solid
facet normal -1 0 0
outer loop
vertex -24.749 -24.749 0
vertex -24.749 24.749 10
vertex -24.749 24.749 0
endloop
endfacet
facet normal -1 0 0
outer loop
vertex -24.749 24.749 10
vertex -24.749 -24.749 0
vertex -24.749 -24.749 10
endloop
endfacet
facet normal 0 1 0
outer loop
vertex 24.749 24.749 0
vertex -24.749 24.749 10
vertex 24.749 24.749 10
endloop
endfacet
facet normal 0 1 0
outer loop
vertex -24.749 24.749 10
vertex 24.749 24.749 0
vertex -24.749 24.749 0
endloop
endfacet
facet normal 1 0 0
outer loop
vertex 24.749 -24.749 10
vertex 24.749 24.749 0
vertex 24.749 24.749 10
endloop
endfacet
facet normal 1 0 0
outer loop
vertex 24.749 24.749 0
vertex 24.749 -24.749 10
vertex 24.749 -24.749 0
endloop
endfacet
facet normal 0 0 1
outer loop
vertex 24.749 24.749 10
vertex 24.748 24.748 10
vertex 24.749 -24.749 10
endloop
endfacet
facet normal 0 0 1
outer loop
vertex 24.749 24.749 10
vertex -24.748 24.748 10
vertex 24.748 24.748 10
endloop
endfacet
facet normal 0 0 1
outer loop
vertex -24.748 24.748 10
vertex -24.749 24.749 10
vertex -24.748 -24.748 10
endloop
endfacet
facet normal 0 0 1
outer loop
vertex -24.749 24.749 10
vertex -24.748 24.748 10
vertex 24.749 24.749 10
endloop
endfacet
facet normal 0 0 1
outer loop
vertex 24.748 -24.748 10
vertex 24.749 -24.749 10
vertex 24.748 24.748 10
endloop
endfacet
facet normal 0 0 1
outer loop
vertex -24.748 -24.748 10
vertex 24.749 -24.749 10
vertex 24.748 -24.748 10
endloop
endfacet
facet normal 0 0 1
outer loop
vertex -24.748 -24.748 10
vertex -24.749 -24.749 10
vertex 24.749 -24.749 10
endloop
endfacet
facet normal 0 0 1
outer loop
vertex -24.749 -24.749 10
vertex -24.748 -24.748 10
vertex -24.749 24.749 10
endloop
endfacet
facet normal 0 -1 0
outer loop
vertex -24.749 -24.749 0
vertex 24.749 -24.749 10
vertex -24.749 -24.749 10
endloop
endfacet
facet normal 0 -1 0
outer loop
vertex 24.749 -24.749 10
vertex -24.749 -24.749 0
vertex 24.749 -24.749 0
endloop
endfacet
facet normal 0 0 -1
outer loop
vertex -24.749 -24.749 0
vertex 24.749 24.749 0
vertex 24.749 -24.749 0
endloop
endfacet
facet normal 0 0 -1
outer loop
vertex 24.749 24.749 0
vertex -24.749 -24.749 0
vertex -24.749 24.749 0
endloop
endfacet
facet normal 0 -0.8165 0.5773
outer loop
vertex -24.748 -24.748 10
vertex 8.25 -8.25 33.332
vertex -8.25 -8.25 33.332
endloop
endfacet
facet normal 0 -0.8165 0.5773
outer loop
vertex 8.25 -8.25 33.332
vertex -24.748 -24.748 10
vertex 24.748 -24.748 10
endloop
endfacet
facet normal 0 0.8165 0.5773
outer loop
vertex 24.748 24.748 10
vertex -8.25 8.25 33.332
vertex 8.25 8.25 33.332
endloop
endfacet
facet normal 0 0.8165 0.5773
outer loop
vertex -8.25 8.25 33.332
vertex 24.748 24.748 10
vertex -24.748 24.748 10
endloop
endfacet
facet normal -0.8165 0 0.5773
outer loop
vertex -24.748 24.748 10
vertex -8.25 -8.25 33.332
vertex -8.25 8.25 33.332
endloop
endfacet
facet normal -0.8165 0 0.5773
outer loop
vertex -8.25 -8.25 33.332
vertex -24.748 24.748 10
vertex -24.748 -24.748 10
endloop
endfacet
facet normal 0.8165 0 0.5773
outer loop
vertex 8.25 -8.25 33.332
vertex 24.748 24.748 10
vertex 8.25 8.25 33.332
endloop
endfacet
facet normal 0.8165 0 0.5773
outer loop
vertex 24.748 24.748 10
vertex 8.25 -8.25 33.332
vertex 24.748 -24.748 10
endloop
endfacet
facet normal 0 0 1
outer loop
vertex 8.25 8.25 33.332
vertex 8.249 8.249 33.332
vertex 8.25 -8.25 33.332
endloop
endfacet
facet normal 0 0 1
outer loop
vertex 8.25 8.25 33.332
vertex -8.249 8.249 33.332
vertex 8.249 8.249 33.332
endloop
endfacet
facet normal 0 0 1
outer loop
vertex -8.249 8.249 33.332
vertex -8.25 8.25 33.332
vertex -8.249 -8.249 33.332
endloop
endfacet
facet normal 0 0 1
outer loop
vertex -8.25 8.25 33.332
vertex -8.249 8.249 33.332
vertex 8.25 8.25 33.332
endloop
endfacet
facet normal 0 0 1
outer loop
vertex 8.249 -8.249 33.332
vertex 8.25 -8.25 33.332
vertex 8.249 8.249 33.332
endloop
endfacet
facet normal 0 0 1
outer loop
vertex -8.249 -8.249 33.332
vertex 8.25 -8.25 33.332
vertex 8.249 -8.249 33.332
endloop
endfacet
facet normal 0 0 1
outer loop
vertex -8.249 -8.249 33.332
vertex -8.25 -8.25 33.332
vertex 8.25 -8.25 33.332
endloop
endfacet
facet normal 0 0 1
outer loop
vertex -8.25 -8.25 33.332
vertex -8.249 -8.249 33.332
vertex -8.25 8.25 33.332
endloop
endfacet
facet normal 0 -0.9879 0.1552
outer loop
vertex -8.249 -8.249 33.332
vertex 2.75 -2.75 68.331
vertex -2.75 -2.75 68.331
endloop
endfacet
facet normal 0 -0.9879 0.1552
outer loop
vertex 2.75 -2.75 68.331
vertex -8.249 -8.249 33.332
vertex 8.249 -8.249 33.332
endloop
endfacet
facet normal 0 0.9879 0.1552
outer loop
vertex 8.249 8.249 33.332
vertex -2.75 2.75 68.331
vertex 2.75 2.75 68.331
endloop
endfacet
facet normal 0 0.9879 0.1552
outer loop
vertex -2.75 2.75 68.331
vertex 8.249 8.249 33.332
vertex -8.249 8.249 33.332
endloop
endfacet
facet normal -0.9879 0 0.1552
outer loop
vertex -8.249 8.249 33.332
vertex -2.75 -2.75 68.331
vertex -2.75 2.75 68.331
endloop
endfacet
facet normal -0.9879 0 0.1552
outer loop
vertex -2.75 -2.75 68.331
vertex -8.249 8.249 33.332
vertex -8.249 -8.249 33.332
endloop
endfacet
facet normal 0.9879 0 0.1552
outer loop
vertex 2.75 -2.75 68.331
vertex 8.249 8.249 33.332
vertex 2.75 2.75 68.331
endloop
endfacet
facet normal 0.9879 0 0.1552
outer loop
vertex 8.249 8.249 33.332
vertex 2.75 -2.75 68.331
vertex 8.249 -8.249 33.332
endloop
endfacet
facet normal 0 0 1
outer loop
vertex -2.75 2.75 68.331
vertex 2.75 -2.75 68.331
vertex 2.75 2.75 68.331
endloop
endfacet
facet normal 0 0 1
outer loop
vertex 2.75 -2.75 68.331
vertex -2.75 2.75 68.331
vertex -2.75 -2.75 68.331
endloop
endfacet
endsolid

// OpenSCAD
// This makes use of the $fn function to limit the number of facets (sides) of cylinders.
// So essentially this is just a cylinder with a couple of cones stacked on top.
// Setting $fn to 3 gives a 3 sided funnel (triangular) funnel.
// Setting $fn to 4 gives a 4 sided (square) funnel.
// etc. The higher the number, the more "round" it becomes.

// REALLY IMPORTANT. THE STL PRODUCES A SOLID OBJECT WHICH WON'T BE MUCH USE AS A FUNNEL. 
// TO MAKE THIS WORK, YOU NEED TO SLICE IT WITH NO TOP AND BOTTOM LAYERS, NO INFILL, BUT 3 OR 4 PERIMETERS.
// THAT WILL PRODUCE A G-CODE WHICH WILL MAKE A HOLLOW FUNNEL.


// Number of sides. 3 makes a trangular funnel, 4 makes a square funnel, 5 would be pentagonal, etc
Number_Of_Sides = 4;

$fn=Number_Of_Sides;

// Width across corners . NOTE this is the width across the corners, not across the flats. 
// Essentialy, the width is the diameter of a circle within which your funnel will fit.
// So for example, if you want a 4 sided cone that is 100 mm across flats, you will need 
// to set the width to approximately 1.4 times greater - i.e. 140mm.

Width_Across_Corners = 70;

dia1=Width_Across_Corners;


// If you want, you can change the proportions by playing around with the following variables.


dia2=dia1/3;
dia3=dia2/3;
h1=dia1/7;
h2=dia1/3;
h3=dia1/2;


// This is the main code section

rotate ([0,0,45])
cylinder (d=dia1, h=h1);
rotate ([0,0,45])
translate ([0,0,(h1-.001)]) // Set the z axis starting point very slightly lower to ensure that it is manifold 
cylinder (d1=dia1, d2=dia2, h= h2);
rotate ([0,0,45])
translate ([0,0,(h1+h2-.002)]) // As above comment.
cylinder (d1=dia2, d2=dia3, h= h3);
